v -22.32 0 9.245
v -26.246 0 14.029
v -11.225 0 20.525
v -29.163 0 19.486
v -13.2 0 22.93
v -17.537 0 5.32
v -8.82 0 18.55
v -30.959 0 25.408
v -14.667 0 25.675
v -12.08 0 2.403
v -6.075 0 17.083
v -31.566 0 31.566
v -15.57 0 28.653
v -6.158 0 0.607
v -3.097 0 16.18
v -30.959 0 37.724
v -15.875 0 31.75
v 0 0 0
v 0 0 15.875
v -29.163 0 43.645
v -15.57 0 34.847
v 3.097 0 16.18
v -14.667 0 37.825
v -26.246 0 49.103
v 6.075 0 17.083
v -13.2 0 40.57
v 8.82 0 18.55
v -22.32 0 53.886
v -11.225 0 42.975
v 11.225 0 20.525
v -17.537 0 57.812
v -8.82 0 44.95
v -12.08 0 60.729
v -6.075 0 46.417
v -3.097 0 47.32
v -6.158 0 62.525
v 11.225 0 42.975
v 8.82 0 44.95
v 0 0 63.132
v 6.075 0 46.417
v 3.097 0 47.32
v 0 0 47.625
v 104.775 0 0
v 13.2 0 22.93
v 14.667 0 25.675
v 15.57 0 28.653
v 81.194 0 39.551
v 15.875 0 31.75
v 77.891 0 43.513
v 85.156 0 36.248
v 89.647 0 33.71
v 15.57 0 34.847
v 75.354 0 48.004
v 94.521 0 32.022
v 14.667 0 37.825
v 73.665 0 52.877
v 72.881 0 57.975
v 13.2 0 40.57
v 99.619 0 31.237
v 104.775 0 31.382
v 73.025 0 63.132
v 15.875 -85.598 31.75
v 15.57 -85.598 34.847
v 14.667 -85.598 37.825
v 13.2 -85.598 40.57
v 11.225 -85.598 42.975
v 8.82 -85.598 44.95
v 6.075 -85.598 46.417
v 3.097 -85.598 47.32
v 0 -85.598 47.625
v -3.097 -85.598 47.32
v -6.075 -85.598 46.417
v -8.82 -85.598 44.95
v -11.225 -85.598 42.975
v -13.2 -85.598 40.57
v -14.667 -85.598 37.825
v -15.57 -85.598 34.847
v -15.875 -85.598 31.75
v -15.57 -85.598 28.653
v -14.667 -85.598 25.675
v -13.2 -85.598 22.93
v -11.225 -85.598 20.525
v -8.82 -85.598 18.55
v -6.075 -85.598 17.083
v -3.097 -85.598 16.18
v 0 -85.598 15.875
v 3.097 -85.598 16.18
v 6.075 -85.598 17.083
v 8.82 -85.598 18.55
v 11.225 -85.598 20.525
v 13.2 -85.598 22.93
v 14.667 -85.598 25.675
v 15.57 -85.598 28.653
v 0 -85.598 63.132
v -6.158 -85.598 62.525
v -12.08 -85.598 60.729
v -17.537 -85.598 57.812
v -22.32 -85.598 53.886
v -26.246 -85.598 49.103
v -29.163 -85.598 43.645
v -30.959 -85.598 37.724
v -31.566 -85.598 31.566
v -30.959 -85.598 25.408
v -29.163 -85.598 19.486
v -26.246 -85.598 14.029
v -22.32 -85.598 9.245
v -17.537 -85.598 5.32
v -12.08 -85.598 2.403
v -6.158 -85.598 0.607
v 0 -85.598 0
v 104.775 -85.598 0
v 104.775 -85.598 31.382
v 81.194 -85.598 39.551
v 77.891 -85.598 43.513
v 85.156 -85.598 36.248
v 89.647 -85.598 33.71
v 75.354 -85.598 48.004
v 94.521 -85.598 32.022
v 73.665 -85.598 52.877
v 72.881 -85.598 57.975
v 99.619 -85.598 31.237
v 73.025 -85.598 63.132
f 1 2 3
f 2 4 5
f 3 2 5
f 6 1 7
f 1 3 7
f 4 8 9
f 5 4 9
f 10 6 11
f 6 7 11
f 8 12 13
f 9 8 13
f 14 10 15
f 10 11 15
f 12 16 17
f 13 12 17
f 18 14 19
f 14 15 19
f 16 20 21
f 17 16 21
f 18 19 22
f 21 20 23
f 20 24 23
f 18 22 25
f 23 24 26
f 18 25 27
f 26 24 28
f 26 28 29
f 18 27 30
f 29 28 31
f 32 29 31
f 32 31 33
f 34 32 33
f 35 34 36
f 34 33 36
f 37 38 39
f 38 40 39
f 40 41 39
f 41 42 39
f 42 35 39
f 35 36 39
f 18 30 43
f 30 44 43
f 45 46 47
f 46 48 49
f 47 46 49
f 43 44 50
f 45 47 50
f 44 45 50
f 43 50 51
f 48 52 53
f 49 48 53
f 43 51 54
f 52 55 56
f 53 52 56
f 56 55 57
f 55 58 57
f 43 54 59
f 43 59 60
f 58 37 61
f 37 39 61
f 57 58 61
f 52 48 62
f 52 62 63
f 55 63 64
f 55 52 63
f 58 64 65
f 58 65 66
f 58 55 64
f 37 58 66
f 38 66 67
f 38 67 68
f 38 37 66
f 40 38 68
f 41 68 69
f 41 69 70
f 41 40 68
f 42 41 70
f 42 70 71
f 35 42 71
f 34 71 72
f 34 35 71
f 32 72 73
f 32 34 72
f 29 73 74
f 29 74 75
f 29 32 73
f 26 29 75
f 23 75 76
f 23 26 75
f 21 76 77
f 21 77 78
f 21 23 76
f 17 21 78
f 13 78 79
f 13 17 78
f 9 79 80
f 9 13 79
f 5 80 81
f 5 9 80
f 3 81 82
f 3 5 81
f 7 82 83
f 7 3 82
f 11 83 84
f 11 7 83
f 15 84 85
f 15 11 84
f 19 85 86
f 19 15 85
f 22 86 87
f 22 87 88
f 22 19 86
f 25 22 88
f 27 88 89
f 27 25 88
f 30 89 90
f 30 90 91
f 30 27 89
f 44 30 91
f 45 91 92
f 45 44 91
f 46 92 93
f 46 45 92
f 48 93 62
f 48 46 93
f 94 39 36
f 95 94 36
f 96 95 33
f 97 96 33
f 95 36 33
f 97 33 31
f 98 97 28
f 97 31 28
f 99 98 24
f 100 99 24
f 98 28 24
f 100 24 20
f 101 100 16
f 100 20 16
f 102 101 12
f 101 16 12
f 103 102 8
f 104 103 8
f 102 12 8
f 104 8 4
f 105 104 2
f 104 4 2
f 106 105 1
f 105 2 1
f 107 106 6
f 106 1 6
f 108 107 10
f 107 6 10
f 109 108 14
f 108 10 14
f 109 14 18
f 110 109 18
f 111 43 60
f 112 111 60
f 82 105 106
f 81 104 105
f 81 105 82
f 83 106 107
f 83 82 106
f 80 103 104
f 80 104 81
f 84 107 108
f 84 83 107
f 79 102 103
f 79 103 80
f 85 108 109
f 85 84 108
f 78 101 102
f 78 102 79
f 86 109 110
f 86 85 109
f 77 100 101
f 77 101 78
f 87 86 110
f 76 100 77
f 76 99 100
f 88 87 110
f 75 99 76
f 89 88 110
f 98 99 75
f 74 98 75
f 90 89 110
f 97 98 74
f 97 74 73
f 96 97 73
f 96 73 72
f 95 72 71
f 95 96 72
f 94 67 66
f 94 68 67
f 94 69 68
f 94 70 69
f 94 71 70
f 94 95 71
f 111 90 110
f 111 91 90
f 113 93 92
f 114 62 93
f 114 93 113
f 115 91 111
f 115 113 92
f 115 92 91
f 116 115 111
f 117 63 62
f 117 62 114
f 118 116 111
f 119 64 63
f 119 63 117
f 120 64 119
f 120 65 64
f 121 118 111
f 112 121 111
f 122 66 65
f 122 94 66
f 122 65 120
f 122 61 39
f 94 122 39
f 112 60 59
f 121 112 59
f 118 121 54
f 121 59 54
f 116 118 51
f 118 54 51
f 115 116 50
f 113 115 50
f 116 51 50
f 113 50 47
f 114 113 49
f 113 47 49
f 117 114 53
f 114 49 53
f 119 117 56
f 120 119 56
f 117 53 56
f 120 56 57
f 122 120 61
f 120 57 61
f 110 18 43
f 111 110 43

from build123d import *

# Parameters (mm, degrees)
F0_R     = 15.875
F1_DEPTH = 85.598


with BuildPart() as f1:
    # F0 (on Front) → F1 (new body)
    with BuildSketch(Plane.XZ):
        with BuildLine():
            ThreePointArc((0, 63.131541), (-31.565771, 31.565771), (0, 0))
            Line((0, 0), (104.775, 0))
            Line((104.775, 0), (104.775, 31.381541))
            ThreePointArc((104.775, 31.381541), (81.194411, 39.550952), (73.025, 63.131541))
            Line((73.025, 63.131541), (0, 63.131541))
        make_face()
        with Locations((0, 31.75)):
            Circle(F0_R, mode=Mode.SUBTRACT)
    extrude(amount=F1_DEPTH)


solid = f1.part
